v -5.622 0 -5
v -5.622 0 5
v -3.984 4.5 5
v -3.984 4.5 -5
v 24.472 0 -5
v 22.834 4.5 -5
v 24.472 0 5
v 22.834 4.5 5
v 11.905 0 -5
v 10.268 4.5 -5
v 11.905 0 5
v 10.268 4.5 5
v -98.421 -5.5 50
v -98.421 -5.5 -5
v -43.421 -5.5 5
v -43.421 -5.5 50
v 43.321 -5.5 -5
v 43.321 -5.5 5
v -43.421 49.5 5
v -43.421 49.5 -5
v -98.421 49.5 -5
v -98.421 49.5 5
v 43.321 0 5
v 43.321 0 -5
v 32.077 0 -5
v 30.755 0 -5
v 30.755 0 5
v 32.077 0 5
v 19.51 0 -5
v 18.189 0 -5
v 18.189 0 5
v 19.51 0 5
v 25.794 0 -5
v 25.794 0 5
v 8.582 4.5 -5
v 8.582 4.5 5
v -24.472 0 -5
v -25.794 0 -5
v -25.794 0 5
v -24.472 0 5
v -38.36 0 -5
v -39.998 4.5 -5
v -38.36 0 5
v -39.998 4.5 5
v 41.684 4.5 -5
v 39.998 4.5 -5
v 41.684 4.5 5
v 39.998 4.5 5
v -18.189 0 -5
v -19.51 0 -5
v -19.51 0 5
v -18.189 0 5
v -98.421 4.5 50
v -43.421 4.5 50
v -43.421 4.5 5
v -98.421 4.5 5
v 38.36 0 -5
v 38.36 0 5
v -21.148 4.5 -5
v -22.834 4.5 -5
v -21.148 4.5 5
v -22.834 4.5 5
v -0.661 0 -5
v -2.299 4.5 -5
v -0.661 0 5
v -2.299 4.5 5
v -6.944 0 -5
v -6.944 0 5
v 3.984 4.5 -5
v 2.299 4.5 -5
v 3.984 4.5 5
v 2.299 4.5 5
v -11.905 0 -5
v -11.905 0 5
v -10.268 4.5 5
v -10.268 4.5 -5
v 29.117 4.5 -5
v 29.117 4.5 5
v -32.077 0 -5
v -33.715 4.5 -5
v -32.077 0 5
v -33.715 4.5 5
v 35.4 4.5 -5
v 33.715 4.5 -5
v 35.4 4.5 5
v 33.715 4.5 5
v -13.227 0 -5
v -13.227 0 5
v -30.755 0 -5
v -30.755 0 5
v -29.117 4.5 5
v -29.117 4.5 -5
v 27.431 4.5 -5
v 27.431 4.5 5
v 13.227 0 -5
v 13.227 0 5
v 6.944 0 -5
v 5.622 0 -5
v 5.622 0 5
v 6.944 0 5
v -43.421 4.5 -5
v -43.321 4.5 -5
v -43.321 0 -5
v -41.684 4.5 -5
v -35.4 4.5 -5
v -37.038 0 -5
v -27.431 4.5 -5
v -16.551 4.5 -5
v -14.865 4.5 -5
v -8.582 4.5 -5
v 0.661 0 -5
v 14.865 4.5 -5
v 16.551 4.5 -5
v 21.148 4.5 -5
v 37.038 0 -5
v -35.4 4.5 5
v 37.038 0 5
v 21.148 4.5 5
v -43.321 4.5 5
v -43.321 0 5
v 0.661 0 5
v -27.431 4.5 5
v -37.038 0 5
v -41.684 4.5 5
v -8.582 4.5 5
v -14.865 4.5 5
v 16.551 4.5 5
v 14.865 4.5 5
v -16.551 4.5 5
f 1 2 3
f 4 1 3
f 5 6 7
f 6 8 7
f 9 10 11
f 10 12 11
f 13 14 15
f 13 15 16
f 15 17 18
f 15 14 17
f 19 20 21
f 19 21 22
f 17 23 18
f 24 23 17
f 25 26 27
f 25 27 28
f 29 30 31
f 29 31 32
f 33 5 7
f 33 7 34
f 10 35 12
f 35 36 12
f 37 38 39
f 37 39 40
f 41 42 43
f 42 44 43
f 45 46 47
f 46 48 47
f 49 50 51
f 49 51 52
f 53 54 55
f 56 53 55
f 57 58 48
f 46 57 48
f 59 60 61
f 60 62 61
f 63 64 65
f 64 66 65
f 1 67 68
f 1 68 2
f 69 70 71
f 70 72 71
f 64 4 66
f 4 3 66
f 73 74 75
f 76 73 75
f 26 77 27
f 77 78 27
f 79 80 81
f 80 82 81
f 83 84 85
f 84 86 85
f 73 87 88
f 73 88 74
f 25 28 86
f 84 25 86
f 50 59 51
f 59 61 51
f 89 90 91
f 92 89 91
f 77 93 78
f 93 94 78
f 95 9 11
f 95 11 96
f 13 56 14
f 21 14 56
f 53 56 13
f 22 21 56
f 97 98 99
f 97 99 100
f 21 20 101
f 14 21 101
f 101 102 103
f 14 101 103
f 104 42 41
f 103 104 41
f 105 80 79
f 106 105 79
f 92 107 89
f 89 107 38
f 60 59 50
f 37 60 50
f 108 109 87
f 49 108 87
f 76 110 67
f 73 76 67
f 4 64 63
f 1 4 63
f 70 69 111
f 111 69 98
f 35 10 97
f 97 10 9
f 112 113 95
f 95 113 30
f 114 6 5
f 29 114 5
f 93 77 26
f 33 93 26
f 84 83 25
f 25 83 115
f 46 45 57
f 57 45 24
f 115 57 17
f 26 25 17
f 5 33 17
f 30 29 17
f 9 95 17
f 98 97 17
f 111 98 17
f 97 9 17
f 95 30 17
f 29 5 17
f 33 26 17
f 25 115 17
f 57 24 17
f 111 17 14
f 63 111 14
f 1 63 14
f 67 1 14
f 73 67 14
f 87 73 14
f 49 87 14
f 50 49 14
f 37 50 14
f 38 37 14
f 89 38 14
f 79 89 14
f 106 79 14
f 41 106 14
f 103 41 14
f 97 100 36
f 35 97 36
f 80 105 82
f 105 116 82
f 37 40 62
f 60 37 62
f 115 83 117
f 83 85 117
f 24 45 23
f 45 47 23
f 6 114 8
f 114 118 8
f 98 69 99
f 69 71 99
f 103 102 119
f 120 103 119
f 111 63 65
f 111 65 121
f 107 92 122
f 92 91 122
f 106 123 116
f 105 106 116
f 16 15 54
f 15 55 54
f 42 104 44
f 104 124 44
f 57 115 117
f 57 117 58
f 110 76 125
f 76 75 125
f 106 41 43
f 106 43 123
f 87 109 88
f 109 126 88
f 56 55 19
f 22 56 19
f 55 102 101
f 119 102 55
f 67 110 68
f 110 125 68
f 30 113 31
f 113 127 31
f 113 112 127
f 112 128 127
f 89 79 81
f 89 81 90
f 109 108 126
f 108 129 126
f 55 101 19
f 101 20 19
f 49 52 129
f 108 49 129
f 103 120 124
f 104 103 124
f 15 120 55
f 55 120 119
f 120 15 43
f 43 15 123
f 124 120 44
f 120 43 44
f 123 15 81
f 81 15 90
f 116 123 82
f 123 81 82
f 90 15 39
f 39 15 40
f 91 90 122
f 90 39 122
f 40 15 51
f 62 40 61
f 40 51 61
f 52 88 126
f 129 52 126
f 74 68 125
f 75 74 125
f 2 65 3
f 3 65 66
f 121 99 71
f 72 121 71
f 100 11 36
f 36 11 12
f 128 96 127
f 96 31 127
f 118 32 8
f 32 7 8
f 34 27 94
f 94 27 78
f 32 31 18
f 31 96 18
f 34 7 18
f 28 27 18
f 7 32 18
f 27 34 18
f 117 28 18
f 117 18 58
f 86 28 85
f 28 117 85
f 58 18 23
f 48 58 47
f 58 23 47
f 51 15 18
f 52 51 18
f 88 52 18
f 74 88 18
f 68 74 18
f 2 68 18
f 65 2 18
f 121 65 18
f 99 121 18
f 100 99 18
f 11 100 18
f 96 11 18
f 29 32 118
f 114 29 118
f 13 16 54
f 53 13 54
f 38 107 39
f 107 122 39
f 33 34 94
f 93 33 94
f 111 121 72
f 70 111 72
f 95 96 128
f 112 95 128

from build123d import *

# Parameters (mm, degrees)
SKETCH_2_W             = 86.642852818
SKETCH_2_H             = 10
EXTRUDE_1_DEPTH        = 5.5
EXTRUDE_2_DEPTH        = 5
PATTERN_LINEAR_1_COUNT = 14
PATTERN_LINEAR_1_PITCH = 6.283185307
SKETCH_6_W             = 10
SKETCH_6_H             = 10
EXTRUDE_3_DEPTH        = 0.1
SKETCH_7_W             = 45
SKETCH_7_H             = 10
SKETCH_7_W_2           = 10
SKETCH_7_H_2           = 45
EXTRUDE_4_DEPTH        = 55


with BuildPart() as part:
    # 草图2 → 凸台-拉伸1 (new body)
    with BuildSketch(Plane(origin=(0, 0, 0), x_dir=(1, 0, 0), z_dir=(0, 1, 0))):
        Rectangle(SKETCH_2_W, SKETCH_2_H)
    extrude(amount=-EXTRUDE_1_DEPTH)

    # 草图3 → 凸台-拉伸2 (add, symmetric)
    with BuildSketch(Plane.XY):
        Polygon((-43.321426409, 0), (-41.683560355, 4.5), (-39.997848638, 4.5), (-38.359982584, 0), align=None)
    extrude_2 = extrude(amount=EXTRUDE_2_DEPTH, both=True)

    # 阵列(线性)1: 凸台-拉伸2 ×14
    with Locations(*[(i * PATTERN_LINEAR_1_PITCH, 0, 0) for i in range(1, PATTERN_LINEAR_1_COUNT)]):
        add(extrude_2)

    # 草图6 → 凸台-拉伸3 (add)
    with BuildSketch(Plane.ZY.offset(43.321426409)):
        with Locations((0, -0.5)):
            Rectangle(SKETCH_6_W, SKETCH_6_H)
    extrude(amount=EXTRUDE_3_DEPTH)

    # 草图7 → 凸台-拉伸4 (add)
    with BuildSketch(Plane.ZY.offset(43.421426409)):
        with Locations((27.5, -0.5)):
            Rectangle(SKETCH_7_W, SKETCH_7_H)
        with Locations((0, -0.5)):
            Rectangle(SKETCH_7_W_2, SKETCH_7_H)
        with Locations((0, 27)):
            Rectangle(SKETCH_7_W_2, SKETCH_7_H_2)
    extrude(amount=EXTRUDE_4_DEPTH)


solid = part.part
